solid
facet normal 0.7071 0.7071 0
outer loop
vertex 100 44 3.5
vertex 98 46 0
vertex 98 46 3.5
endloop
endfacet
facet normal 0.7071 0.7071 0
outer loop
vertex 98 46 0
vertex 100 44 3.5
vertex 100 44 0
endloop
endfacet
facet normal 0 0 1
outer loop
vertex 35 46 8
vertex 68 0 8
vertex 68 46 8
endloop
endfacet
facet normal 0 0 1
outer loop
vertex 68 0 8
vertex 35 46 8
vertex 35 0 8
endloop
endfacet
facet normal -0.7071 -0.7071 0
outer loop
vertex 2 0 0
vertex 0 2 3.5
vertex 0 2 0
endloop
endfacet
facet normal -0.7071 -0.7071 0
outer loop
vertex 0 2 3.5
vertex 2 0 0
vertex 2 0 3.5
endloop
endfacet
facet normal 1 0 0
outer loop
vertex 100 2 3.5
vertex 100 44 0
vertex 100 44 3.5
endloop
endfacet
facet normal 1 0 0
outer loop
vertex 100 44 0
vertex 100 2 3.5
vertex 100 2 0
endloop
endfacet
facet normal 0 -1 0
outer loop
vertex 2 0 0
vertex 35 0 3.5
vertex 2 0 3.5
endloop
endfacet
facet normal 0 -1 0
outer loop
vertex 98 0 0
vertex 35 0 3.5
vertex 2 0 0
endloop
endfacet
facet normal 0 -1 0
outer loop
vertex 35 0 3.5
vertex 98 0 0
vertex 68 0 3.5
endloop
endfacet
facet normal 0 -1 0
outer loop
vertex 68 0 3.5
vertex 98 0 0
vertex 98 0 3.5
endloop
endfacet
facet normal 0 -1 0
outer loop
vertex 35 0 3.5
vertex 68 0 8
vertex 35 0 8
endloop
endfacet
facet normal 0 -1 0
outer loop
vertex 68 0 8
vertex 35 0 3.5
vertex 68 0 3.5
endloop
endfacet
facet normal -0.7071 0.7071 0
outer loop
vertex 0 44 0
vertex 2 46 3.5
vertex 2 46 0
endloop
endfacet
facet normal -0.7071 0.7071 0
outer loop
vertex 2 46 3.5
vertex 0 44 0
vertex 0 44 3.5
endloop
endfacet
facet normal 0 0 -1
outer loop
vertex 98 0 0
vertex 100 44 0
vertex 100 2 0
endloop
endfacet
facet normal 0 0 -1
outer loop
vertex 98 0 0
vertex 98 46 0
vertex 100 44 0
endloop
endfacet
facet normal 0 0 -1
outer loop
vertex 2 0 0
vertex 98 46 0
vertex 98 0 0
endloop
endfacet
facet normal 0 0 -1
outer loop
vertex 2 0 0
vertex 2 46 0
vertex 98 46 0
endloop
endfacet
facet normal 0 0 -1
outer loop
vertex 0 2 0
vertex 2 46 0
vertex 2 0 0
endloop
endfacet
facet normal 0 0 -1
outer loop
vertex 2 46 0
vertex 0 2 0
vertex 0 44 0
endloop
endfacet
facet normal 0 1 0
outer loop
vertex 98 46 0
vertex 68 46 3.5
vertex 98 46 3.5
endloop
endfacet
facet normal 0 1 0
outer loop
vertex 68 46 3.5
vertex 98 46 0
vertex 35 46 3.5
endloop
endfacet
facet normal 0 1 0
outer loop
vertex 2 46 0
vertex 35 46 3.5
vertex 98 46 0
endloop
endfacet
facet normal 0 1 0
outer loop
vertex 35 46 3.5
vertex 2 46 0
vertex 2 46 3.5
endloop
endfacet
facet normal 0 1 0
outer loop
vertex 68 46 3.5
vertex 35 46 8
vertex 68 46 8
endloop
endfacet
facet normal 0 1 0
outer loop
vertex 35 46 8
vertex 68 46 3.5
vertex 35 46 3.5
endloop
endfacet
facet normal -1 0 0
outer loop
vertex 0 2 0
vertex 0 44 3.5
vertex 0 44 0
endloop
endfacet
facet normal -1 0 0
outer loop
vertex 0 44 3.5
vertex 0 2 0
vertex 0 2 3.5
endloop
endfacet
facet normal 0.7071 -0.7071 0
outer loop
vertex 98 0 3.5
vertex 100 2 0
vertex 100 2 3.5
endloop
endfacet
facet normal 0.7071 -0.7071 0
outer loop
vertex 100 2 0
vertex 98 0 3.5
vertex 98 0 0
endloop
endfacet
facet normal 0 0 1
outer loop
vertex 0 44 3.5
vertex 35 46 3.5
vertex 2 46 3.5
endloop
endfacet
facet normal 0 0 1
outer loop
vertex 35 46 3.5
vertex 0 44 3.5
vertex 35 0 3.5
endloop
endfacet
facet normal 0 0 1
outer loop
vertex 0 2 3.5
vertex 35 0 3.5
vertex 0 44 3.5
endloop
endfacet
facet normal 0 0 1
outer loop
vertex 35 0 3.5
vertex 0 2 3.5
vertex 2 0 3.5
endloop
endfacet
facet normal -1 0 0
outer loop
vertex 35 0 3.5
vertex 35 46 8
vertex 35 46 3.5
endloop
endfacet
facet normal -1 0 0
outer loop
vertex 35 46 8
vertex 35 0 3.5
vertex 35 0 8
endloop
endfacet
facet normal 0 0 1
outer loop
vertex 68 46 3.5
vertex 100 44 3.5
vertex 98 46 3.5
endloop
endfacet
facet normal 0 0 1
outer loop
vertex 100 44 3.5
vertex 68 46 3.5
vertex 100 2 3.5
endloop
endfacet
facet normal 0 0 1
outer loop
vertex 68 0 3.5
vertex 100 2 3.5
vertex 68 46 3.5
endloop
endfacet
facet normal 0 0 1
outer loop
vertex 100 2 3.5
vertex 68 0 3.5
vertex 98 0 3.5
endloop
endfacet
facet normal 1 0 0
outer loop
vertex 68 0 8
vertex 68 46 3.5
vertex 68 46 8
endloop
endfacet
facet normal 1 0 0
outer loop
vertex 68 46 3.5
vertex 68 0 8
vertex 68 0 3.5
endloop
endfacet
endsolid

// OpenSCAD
$fn = 32;

// ----------------------------------------------------------------------
// Stepped bar: centerstep, 100 x 46 x 8/3.5 mm
// ----------------------------------------------------------------------

// --- parameters (mm) ---
bar_l = 100;              // bar length, X
bar_w = 46;               // bar width, Y
plate_t = 8;              // thickness of the thick zone, Z
thin_t = 3.5;             // thickness of the thin zone
corner_c = 2;             // corner chamfer of the bar
step_cut = 4.5;           // material removed from the thin zone
thick_from = 35;          // start of the thick middle zone
thick_to = 68;            // end of the thick middle zone
depth_1 = 4.5;            // depth of cut 1 from the top face
depth_2 = 4.5;            // depth of cut 2 from the top face
fit_tol = 0.1;            // declared fit tolerance (prompt contract)
free_tol = 0.3;           // declared free tolerance (prompt contract)

profile = [[2, 0], [98, 0], [100, 2], [100, 44], [98, 46], [2, 46], [0, 44], [0, 2]];  // primary outline, 8 points, counter clockwise
void_1 = [[-1, -1], [35, -1], [35, 47], [-1, 47]];  // thin left end, 4 points
void_2 = [[68, -1], [101, -1], [101, 47], [68, 47]];  // thin right end, 4 points

// --- the one profile operation ---
difference() {
  linear_extrude(height = plate_t) polygon(points = profile);
  translate([0, 0, plate_t - depth_1])
    linear_extrude(height = depth_1 + 1) polygon(points = void_1);
  translate([0, 0, plate_t - depth_2])
    linear_extrude(height = depth_2 + 1) polygon(points = void_2);
}
